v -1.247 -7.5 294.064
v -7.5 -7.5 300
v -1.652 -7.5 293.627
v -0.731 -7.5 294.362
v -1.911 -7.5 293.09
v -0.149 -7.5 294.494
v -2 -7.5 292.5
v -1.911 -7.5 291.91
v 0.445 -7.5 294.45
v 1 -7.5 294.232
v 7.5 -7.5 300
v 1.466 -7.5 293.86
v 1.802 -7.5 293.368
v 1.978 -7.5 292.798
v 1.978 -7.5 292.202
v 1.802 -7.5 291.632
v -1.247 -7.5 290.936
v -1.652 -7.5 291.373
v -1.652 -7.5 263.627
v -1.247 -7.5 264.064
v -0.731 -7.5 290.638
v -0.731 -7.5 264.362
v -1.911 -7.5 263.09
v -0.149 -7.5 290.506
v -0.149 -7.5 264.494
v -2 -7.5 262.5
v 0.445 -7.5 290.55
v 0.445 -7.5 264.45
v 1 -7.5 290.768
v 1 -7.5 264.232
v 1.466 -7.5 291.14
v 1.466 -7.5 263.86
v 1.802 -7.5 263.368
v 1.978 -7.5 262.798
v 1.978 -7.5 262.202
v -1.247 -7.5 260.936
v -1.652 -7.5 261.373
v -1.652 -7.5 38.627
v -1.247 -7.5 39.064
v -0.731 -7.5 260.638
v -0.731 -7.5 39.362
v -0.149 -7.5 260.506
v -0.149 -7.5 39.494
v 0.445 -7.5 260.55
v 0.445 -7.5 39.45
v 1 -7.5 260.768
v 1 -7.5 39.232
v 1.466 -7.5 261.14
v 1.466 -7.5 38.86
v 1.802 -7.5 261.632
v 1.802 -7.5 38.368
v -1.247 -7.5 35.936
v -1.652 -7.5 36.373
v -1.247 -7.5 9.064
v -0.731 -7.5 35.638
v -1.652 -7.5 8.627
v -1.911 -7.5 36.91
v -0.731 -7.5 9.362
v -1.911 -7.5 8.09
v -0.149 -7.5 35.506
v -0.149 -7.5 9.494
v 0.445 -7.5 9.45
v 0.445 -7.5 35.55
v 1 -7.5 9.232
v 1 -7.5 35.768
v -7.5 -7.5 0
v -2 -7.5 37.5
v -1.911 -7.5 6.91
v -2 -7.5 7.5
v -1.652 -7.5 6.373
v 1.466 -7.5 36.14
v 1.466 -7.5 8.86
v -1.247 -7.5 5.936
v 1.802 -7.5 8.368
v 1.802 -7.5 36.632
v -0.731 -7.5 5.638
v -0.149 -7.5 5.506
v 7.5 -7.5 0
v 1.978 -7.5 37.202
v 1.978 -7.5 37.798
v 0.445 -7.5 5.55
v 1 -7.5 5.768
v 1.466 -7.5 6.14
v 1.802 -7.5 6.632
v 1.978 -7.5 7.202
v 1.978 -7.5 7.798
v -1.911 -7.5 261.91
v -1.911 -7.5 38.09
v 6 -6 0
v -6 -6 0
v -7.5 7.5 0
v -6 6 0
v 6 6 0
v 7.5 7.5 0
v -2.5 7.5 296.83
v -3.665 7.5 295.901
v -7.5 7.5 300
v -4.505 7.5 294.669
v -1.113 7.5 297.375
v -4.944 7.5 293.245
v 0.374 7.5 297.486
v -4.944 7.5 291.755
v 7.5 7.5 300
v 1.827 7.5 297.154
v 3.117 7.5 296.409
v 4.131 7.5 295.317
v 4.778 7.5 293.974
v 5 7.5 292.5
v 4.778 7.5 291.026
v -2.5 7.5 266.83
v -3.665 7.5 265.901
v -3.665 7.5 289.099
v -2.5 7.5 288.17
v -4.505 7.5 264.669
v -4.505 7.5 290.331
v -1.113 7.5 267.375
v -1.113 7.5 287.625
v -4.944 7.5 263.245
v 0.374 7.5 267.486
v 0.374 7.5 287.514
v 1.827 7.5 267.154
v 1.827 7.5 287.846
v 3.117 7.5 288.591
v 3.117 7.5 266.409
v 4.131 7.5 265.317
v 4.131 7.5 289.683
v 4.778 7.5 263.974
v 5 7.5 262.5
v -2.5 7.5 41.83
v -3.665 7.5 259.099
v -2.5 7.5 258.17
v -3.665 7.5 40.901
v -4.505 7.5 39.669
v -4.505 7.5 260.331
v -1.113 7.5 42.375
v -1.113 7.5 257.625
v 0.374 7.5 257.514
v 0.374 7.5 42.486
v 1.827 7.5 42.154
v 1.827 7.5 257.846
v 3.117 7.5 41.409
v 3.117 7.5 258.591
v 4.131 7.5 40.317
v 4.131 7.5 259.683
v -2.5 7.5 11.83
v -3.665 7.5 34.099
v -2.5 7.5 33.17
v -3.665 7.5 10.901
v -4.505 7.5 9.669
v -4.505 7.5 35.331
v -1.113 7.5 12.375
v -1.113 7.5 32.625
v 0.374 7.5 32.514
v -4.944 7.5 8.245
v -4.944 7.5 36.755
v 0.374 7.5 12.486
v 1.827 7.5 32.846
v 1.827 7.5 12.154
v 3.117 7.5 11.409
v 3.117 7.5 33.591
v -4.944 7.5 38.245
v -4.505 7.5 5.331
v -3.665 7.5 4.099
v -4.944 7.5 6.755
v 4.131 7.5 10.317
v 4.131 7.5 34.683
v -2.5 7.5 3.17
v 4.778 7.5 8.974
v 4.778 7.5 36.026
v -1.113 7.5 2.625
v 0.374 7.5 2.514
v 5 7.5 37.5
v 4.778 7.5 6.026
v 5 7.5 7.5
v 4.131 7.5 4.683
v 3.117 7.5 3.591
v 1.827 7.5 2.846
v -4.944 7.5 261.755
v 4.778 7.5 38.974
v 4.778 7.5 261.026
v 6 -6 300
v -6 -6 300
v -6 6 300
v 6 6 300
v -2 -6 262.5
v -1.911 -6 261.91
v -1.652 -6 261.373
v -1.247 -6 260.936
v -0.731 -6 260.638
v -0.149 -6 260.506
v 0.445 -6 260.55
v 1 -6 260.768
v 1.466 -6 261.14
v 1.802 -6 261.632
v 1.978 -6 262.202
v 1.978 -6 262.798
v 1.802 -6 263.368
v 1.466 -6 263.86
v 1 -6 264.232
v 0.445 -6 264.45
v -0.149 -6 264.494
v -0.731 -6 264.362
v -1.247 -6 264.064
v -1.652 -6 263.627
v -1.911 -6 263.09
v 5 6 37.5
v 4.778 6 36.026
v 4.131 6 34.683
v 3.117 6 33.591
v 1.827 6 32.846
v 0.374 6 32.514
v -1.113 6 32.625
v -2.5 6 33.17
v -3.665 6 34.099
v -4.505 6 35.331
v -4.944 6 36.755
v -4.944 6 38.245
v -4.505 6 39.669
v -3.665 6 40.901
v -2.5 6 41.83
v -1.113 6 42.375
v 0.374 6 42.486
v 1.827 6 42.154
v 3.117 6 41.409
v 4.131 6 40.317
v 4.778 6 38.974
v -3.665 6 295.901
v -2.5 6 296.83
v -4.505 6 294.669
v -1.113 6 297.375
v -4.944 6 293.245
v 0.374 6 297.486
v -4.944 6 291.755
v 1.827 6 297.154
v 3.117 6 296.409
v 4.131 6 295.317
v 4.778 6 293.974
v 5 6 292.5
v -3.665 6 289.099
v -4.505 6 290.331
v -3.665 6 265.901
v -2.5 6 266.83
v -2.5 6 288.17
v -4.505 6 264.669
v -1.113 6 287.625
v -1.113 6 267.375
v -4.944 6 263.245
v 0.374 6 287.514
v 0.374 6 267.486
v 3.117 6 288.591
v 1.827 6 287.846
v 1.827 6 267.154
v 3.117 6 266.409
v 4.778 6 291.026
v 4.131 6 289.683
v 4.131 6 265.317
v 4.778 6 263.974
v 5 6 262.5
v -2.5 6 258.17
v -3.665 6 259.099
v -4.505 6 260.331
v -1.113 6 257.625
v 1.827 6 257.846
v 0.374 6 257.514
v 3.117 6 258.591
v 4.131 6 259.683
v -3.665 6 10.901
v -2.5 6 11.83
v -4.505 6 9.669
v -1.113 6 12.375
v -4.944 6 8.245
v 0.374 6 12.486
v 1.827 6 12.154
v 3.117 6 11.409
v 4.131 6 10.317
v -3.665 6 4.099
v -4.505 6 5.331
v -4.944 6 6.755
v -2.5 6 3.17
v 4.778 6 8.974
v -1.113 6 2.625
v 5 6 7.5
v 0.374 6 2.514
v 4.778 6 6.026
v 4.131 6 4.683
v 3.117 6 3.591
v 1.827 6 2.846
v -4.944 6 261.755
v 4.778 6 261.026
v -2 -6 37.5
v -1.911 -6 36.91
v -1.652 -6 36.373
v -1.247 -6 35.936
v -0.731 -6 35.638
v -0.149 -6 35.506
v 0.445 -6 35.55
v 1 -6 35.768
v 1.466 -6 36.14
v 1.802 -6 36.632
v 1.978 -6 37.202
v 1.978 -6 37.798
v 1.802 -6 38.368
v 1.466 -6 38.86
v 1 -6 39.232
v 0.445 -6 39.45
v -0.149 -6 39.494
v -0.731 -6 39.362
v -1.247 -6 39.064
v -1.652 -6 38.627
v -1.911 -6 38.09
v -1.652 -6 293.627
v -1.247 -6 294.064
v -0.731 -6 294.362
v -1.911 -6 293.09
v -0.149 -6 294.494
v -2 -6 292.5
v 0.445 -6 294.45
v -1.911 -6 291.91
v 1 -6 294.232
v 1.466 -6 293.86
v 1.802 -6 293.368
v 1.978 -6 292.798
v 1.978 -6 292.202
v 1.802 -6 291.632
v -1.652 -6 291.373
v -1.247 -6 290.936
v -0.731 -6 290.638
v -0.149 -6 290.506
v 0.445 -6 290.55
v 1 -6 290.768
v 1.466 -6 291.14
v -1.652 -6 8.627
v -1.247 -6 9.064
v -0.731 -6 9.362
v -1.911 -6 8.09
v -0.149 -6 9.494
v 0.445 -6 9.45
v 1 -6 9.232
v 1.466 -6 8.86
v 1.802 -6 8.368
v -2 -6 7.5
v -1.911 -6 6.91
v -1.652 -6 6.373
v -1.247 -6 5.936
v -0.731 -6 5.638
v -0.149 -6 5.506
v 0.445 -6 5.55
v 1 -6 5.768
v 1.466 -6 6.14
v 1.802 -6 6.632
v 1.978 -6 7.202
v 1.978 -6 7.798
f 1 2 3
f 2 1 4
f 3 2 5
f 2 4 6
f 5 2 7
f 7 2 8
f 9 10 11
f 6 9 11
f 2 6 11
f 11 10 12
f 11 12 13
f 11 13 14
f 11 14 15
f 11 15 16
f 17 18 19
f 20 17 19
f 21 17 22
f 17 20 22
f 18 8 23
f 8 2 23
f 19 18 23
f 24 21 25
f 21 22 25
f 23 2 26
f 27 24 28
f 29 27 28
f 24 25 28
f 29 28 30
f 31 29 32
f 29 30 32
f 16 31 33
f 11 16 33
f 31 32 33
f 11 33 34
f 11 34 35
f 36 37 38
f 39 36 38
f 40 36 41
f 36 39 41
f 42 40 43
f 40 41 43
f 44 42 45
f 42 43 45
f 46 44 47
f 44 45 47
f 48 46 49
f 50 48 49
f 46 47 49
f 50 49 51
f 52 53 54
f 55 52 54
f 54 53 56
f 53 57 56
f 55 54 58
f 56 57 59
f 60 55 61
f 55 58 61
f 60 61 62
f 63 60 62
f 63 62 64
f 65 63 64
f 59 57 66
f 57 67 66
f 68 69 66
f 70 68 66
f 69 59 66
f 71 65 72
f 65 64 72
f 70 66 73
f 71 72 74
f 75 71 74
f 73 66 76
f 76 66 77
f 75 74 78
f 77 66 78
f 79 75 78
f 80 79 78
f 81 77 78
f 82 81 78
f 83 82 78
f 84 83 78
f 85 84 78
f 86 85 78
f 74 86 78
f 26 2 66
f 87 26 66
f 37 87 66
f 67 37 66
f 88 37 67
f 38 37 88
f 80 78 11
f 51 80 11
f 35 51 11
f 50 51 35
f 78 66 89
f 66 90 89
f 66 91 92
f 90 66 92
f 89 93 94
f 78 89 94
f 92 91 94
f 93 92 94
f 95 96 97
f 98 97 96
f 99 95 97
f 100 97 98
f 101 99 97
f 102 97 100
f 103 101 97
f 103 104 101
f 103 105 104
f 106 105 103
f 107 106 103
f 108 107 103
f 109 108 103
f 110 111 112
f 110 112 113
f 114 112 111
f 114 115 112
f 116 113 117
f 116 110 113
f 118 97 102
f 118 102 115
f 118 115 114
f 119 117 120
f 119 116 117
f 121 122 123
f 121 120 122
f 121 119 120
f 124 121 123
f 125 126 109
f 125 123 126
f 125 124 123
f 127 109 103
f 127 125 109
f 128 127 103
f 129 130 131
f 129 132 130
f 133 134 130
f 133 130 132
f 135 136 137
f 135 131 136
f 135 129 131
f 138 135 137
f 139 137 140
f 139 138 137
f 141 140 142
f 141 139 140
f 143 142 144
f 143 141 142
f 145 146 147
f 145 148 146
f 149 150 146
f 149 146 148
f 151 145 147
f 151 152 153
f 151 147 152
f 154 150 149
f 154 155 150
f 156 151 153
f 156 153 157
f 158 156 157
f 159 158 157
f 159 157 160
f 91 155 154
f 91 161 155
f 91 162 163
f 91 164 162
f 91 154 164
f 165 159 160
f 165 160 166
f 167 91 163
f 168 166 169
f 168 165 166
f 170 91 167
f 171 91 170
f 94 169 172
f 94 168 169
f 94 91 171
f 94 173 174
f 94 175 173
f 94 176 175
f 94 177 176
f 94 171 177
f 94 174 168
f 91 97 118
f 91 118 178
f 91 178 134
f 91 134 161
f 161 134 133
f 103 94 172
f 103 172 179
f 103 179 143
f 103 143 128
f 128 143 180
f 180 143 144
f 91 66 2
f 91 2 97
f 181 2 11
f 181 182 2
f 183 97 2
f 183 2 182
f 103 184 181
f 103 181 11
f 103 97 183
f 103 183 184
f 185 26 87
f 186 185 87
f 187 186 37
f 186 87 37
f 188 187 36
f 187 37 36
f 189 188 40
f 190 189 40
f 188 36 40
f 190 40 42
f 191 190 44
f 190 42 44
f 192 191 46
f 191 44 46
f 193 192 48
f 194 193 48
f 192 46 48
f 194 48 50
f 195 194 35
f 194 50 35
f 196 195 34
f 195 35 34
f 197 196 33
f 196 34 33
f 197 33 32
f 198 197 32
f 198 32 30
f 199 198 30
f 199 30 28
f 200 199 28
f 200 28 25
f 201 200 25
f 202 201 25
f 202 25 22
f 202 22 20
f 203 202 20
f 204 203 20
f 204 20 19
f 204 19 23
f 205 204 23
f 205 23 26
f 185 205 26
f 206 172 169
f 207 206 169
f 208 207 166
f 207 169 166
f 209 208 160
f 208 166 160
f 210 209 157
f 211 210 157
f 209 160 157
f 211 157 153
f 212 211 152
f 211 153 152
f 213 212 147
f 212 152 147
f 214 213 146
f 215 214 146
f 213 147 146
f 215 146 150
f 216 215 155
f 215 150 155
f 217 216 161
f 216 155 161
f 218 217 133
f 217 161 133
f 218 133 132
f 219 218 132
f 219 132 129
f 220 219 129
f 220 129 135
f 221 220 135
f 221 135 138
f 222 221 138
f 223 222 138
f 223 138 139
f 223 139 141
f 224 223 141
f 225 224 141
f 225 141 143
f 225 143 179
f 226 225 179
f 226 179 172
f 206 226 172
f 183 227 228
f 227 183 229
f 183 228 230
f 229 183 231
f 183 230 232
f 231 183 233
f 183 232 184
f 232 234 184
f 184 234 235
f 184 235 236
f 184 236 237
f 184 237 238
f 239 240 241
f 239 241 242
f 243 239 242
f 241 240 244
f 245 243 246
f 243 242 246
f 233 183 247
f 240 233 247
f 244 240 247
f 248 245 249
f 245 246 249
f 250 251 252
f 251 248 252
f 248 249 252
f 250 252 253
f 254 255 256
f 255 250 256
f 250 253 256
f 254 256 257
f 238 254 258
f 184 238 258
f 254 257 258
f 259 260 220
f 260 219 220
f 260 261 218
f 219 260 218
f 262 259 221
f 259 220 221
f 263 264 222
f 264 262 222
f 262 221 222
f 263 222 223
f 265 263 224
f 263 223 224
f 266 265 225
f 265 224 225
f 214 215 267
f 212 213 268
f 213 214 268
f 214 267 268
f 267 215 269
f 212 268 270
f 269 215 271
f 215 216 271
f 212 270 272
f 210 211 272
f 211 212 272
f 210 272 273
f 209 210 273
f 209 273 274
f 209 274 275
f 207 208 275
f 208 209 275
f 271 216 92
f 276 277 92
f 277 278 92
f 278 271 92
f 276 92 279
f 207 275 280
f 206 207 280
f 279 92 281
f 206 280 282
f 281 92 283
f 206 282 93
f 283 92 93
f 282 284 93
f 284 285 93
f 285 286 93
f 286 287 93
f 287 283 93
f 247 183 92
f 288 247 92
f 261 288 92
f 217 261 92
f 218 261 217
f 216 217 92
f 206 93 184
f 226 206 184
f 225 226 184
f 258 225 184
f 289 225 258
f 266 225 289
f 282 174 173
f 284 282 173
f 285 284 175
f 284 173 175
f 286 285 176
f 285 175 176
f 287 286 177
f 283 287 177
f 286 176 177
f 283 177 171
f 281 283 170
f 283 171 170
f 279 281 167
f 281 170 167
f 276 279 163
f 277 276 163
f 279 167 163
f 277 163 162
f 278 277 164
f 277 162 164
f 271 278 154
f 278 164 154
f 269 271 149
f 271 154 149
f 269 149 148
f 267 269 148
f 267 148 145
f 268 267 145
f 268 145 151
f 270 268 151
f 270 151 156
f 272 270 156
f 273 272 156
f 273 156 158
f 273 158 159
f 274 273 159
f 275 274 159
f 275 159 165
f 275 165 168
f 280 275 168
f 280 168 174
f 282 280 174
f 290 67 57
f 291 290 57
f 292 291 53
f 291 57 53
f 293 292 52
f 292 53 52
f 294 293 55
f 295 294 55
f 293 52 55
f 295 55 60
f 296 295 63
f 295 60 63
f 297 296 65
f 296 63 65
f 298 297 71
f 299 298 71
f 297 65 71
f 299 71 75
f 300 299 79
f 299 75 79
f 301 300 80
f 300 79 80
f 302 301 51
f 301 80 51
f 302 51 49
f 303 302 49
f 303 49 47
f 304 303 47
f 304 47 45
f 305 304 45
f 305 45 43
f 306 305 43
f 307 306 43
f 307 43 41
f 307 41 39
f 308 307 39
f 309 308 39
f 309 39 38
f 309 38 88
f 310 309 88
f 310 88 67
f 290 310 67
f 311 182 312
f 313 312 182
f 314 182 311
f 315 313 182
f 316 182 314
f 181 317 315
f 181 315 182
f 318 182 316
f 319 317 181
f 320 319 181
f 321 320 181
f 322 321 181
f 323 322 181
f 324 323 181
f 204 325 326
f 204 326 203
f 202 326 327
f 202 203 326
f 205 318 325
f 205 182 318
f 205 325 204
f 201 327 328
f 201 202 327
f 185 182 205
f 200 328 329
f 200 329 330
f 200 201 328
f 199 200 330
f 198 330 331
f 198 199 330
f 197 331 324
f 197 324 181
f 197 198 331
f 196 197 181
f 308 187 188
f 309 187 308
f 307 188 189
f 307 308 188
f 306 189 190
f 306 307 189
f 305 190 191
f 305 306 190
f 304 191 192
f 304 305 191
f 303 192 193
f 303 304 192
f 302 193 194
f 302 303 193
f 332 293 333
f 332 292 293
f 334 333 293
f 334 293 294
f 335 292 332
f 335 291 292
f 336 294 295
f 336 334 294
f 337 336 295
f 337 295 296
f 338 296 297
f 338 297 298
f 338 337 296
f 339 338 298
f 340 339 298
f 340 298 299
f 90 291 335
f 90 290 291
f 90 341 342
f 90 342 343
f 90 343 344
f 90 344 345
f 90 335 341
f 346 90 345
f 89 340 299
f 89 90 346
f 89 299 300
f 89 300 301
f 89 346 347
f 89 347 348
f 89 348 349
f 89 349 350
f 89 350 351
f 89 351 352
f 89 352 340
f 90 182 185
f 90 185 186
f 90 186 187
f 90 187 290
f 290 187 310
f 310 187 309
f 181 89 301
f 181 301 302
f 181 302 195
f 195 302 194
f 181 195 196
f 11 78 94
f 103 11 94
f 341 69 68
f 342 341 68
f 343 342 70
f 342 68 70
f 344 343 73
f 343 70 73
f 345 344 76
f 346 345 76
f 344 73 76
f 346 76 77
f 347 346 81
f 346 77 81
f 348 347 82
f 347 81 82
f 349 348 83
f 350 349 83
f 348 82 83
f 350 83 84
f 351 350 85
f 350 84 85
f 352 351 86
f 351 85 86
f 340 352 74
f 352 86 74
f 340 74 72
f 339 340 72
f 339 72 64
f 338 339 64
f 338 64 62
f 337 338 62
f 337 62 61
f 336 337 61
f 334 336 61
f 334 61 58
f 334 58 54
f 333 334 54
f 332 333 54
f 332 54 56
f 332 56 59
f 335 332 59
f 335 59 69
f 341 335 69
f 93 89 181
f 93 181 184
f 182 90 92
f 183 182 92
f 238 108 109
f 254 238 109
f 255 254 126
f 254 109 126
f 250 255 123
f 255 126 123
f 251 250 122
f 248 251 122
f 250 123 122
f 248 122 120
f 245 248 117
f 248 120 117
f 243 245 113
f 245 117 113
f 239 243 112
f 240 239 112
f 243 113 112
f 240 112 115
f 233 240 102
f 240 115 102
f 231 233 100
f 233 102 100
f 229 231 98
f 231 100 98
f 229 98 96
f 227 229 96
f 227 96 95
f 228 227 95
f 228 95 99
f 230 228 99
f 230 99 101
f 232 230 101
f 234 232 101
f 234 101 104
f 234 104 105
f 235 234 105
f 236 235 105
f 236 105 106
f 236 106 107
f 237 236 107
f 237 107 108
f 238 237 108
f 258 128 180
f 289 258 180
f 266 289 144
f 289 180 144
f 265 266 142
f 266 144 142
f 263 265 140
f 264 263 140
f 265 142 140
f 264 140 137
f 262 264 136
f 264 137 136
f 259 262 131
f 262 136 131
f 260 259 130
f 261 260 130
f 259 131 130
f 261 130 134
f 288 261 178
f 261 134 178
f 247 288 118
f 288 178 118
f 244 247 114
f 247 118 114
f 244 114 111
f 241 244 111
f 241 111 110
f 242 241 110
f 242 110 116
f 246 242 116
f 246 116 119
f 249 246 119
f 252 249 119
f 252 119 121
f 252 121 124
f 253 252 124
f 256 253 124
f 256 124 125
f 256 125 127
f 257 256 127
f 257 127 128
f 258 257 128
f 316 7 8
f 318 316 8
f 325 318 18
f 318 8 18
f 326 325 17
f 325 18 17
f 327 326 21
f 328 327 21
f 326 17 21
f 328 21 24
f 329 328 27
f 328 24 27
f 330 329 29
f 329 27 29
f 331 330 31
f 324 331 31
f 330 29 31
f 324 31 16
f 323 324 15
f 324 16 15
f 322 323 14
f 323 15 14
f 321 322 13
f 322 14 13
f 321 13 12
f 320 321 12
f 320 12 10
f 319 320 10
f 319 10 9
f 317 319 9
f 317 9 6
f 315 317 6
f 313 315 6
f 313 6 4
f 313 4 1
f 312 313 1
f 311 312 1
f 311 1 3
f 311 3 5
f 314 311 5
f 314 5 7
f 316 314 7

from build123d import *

# Parameters (mm, degrees)
SKETCH_1_W          = 15
SKETCH_1_H          = 15
SKETCH_1_W_2        = 12
SKETCH_1_H_2        = 12
EXTRUDE_1_DEPTH     = 300
SKETCH_5_R          = 2
CUT_EXTRUDE_4_DEPTH = 20
SKETCH_8_R          = 5
CUT_EXTRUDE_5_DEPTH = 10


with BuildPart() as part:
    # ｽｹｯﾁ1 → ﾎﾞｽ - 押し出し1 (new body)
    with BuildSketch(Plane.XY):
        Rectangle(SKETCH_1_W, SKETCH_1_H)
        Rectangle(SKETCH_1_W_2, SKETCH_1_H_2, mode=Mode.SUBTRACT)
    extrude(amount=EXTRUDE_1_DEPTH)

    # ｽｹｯﾁ5 → ｶｯﾄ - 押し出し4 (cut)
    with BuildSketch(Plane(origin=(0, -7.5, 0), x_dir=(-1, 0, 0), z_dir=(0, -1, 0))):
        with Locations((0, -37.5)):
            Circle(SKETCH_5_R)
        with Locations((0, -7.5)):
            Circle(SKETCH_5_R)
        with Locations((0, -292.5)):
            Circle(SKETCH_5_R)
        with Locations((0, -262.5)):
            Circle(SKETCH_5_R)
    extrude(amount=-CUT_EXTRUDE_4_DEPTH, mode=Mode.SUBTRACT)

    # ｽｹｯﾁ8 → ｶｯﾄ - 押し出し5 (cut)
    with BuildSketch(Plane(origin=(0, 7.5, 0), x_dir=(1, 0, 0), z_dir=(0, 1, 0))):
        with Locations((0, -292.5)):
            Circle(SKETCH_8_R)
        with Locations((0, -262.5)):
            Circle(SKETCH_8_R)
        with Locations((0, -37.5)):
            Circle(SKETCH_8_R)
        with Locations((0, -7.5)):
            Circle(SKETCH_8_R)
    extrude(amount=-CUT_EXTRUDE_5_DEPTH, mode=Mode.SUBTRACT)


solid = part.part
